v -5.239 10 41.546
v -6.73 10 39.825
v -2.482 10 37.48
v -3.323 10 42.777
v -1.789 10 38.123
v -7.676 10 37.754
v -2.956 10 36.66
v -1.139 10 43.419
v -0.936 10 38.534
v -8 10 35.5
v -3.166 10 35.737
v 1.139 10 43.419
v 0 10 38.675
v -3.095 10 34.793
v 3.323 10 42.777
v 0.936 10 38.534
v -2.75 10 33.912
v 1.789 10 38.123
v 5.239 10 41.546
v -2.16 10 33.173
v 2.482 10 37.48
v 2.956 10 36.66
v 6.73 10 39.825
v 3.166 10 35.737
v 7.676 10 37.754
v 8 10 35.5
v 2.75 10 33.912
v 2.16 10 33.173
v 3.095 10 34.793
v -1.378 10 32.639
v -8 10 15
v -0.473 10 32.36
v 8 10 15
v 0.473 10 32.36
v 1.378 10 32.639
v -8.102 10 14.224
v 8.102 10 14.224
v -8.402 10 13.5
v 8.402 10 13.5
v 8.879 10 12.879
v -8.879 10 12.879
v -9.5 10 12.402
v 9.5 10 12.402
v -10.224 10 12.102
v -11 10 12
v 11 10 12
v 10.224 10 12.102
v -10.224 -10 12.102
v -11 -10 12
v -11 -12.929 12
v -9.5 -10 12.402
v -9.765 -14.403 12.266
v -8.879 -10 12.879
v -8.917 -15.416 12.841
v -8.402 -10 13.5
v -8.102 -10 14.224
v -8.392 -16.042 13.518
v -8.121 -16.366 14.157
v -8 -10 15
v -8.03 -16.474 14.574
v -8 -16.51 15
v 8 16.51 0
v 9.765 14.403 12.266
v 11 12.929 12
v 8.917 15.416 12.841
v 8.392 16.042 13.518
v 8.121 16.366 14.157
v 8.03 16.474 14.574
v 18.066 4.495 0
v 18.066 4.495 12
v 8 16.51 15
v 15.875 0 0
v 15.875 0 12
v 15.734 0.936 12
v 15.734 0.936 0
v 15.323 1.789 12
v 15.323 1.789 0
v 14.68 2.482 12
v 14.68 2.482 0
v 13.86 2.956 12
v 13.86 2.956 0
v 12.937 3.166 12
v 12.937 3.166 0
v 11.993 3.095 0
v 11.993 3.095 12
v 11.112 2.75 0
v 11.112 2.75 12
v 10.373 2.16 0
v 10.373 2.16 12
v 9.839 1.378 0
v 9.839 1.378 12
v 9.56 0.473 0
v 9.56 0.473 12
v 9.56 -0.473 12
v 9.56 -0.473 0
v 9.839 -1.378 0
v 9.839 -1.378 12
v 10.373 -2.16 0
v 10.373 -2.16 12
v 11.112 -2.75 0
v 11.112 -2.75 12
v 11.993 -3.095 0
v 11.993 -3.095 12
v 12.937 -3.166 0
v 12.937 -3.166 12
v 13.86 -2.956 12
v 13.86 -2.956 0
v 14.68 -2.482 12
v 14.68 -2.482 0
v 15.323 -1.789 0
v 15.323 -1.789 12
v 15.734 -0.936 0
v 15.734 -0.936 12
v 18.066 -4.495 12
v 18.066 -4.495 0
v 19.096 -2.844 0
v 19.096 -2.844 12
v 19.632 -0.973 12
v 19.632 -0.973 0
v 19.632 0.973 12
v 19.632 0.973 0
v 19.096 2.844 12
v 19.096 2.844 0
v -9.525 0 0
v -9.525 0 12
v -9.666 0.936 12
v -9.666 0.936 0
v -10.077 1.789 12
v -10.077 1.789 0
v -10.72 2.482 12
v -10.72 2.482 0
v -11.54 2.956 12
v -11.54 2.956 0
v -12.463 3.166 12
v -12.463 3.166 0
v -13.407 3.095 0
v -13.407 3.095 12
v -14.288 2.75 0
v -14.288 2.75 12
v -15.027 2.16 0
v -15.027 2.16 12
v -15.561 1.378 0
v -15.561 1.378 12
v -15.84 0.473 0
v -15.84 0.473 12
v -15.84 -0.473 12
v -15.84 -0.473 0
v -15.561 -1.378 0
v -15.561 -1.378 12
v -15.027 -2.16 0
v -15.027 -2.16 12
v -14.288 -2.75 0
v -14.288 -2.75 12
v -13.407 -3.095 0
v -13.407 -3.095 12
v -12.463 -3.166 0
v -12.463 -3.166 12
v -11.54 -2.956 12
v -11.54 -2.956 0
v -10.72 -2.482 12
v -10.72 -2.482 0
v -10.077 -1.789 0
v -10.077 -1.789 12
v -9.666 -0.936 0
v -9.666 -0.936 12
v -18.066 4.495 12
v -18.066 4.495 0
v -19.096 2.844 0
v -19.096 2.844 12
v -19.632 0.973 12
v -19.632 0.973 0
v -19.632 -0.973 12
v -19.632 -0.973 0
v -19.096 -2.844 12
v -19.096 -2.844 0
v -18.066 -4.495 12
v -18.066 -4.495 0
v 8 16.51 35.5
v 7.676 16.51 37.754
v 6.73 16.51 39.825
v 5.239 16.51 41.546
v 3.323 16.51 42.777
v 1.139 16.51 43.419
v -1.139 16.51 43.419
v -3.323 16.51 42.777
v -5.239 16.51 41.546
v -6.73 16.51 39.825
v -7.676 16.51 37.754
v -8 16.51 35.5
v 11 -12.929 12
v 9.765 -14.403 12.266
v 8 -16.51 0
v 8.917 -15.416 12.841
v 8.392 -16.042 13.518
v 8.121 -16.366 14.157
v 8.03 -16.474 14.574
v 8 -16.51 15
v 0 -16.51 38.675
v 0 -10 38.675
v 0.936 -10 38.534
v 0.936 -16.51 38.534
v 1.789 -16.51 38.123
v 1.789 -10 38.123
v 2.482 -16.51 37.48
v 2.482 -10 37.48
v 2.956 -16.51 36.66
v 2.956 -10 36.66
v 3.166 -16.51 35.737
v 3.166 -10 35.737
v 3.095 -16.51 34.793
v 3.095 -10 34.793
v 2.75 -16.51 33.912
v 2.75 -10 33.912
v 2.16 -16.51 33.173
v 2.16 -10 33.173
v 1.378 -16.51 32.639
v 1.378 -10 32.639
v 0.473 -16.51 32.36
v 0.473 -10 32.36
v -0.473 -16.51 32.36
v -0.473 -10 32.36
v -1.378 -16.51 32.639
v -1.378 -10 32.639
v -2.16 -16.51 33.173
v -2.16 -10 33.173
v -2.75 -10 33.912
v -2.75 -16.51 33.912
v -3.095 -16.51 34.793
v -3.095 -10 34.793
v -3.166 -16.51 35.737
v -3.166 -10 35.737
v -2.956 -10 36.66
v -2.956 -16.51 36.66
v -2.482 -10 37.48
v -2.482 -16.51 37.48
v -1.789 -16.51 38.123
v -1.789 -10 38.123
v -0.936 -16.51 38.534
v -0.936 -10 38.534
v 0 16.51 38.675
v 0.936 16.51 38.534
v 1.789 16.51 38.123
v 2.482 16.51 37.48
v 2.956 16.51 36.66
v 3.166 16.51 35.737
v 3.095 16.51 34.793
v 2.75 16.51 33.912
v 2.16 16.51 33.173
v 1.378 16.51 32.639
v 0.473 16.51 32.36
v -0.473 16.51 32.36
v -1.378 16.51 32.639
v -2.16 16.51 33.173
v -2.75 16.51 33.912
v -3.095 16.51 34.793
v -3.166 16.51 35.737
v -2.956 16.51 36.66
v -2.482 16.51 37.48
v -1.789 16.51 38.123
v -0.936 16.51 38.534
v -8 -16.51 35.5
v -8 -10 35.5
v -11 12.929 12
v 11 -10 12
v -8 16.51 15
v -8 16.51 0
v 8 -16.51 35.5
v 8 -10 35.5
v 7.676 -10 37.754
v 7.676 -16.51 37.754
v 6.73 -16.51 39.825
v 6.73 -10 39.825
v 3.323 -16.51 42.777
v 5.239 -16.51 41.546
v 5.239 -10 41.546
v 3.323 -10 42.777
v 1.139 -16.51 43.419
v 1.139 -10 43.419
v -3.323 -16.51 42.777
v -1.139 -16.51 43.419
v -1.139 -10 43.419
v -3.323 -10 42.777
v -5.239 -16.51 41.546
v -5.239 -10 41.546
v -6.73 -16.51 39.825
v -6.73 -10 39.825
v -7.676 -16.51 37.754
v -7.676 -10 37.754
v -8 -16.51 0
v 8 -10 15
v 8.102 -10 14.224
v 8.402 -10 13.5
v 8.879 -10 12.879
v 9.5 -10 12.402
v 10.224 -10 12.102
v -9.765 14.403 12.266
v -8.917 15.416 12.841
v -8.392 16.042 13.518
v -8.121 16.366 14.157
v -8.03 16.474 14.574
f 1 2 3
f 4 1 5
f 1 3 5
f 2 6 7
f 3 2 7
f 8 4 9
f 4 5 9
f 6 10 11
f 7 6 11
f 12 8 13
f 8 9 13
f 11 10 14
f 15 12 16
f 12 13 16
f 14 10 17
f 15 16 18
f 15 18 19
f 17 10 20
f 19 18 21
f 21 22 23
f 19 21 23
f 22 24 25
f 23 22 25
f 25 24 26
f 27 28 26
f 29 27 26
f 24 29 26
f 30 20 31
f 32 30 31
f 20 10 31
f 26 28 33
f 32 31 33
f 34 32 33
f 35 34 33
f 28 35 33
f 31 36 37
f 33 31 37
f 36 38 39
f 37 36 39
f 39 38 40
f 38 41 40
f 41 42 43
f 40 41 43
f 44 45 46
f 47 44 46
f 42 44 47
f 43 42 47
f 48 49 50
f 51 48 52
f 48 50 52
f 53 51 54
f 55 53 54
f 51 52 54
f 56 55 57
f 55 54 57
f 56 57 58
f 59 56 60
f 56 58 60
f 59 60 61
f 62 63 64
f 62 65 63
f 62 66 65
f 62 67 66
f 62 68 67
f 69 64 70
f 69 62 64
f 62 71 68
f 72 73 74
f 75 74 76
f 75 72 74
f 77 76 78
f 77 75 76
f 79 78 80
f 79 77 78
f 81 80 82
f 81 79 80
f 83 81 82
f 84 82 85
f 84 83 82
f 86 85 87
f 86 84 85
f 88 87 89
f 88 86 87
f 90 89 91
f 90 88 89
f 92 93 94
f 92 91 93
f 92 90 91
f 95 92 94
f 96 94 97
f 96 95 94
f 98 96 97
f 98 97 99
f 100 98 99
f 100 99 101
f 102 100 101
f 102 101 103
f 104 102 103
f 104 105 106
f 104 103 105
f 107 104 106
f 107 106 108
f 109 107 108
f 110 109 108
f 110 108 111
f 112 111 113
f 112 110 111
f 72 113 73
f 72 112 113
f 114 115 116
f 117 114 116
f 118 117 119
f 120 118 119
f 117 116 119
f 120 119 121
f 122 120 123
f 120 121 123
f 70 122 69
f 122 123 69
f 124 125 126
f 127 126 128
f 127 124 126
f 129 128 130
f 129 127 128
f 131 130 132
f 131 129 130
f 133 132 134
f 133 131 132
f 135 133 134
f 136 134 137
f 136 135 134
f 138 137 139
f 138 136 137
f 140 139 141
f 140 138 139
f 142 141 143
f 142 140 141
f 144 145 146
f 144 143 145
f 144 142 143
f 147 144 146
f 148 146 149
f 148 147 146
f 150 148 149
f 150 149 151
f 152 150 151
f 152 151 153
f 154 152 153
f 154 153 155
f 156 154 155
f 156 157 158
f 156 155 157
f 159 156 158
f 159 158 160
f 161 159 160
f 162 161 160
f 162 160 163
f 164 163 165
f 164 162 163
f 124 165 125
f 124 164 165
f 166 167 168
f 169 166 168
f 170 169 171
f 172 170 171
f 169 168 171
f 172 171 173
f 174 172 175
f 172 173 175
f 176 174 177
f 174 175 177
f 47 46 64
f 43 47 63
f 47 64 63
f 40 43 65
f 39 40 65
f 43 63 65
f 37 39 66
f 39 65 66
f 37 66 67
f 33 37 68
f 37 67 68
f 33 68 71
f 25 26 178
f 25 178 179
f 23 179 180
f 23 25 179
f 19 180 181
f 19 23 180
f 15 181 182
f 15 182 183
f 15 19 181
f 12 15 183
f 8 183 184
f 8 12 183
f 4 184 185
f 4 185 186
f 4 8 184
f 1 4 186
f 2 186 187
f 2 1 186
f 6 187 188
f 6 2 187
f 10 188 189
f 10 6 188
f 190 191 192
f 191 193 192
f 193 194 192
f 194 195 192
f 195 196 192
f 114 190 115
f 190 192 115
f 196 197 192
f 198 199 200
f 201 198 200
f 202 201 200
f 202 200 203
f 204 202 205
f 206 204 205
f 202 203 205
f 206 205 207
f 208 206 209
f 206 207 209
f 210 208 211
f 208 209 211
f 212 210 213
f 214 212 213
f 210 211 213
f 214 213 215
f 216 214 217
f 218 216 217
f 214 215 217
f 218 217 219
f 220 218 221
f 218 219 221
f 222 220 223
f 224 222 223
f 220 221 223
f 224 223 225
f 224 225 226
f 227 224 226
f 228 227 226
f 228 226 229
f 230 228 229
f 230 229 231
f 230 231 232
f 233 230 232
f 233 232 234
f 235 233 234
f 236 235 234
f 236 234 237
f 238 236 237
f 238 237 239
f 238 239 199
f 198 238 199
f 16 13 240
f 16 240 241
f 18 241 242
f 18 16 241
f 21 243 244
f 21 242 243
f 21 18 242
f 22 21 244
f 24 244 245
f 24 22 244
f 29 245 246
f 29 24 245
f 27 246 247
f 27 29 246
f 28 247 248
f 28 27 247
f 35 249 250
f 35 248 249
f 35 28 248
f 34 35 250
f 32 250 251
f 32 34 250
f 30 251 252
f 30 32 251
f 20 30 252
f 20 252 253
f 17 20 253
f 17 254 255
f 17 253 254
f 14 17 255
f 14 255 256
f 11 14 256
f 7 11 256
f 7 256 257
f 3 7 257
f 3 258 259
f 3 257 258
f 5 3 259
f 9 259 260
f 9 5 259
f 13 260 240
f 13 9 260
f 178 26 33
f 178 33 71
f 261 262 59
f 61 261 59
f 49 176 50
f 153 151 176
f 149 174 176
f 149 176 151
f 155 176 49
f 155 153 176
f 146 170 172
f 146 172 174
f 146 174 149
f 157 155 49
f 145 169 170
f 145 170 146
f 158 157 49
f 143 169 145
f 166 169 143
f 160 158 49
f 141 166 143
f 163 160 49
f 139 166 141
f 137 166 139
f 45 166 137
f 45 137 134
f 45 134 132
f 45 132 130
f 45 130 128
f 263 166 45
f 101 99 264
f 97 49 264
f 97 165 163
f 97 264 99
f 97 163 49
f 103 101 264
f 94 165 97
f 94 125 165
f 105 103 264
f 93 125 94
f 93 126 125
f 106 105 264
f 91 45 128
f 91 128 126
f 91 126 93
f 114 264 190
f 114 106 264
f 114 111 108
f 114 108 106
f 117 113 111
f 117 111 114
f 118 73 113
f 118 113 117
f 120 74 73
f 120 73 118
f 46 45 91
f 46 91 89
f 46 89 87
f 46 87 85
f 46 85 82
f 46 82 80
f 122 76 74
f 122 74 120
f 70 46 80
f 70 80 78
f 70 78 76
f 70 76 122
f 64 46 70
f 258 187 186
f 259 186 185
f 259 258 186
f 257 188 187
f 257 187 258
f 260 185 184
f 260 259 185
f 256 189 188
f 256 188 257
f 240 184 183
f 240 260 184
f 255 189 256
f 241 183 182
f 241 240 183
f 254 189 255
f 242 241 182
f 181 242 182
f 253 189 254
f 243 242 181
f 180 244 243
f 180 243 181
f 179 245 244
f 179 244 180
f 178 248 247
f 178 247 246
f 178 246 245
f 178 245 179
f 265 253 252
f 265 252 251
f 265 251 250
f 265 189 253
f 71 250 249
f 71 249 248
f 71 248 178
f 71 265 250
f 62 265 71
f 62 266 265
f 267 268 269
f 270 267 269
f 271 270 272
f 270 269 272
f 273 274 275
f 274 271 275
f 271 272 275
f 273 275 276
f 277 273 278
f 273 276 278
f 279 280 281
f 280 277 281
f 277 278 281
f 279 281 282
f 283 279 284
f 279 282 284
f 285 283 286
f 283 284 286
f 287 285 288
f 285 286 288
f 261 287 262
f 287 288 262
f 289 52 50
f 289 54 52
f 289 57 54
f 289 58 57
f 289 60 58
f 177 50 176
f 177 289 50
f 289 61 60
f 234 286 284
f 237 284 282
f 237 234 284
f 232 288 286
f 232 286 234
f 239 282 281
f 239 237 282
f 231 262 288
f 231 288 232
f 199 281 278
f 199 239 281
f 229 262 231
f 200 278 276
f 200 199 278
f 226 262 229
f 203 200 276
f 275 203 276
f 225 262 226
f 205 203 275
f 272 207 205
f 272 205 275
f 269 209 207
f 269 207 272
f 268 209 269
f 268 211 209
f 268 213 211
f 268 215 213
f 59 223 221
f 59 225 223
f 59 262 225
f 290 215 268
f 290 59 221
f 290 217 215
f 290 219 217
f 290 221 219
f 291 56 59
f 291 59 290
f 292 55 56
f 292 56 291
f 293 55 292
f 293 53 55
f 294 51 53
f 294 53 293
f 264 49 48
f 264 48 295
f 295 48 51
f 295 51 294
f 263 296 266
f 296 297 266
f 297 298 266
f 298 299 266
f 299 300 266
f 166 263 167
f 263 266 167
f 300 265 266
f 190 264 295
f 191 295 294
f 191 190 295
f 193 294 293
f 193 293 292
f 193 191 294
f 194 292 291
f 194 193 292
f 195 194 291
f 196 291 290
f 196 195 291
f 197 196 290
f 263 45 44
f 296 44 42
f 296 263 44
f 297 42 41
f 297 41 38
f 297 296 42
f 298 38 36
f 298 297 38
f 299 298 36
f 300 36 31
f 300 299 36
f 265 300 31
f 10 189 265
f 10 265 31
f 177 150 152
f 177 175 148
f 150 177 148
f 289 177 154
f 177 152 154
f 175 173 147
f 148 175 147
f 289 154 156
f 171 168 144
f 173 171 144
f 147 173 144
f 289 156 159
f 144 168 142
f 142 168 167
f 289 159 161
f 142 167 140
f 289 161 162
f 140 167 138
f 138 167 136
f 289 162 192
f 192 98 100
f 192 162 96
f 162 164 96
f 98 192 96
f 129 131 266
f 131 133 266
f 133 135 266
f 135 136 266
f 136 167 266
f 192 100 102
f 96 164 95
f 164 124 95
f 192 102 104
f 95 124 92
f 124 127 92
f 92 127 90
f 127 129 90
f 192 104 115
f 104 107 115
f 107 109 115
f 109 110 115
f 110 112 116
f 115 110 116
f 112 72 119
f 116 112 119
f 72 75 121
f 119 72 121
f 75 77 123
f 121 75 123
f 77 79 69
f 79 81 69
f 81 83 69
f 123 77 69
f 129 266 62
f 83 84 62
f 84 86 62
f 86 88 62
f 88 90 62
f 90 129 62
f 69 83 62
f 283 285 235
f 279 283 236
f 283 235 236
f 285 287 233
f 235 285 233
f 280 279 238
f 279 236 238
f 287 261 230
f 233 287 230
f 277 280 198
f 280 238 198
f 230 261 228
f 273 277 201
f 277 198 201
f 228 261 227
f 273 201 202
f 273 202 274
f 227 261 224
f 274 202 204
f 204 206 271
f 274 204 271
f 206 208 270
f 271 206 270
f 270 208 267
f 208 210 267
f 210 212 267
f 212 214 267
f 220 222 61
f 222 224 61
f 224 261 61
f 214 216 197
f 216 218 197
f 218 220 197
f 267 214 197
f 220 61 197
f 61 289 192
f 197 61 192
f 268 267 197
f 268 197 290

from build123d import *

# Parameters (mm, degrees)
SKETCH1_W                      = 41.4
SKETCH1_H                      = 33.02
SKETCH1_R                      = 3.175
BOSS_EXTRUDE1_DEPTH            = 12
SKETCH2_W                      = 41.4
SKETCH2_H                      = 6.51
BOSS_EXTRUDE2_DEPTH            = 53
CUT_EXTRUDE1_REACH             = 72.186
SKETCH4_R                      = 3.175
CUT_EXTRUDE1_DIRECTION_2_REACH = 72.186
CUT_EXTRUDE3_REACH             = 72.186
CUT_EXTRUDE3_DIRECTION_2_REACH = 72.186
CUT_EXTRUDE4_DEPTH             = 12
BOSS_EXTRUDE3_DEPTH            = 12
FILLET3_R                      = 3


with BuildPart() as part:
    # Sketch1 → Boss-Extrude1 (new body)
    with BuildSketch(Plane.XY):
        Rectangle(SKETCH1_W, SKETCH1_H)
        with Locations((12.7, 0)):
            Circle(SKETCH1_R, mode=Mode.SUBTRACT)
        with Locations((-12.7, 0)):
            Circle(SKETCH1_R, mode=Mode.SUBTRACT)
    extrude(amount=BOSS_EXTRUDE1_DEPTH)

    # Sketch2 → Boss-Extrude2 (add)
    with BuildSketch(Plane.XY.offset(12)):
        with Locations((0, 13.255)):
            Rectangle(SKETCH2_W, SKETCH2_H)
        with Locations((0, -13.255)):
            Rectangle(SKETCH2_W, SKETCH2_H)
    extrude(amount=BOSS_EXTRUDE2_DEPTH)

    # Cut-Extrude1: up to this face of the body (flat: up to its plane)
    cut_extrude1_end = Plane(part.part.faces().sort_by_distance((0, -16.51, 32.5))[0])
    # Sketch4 → Cut-Extrude1 (cut, up to the picked face)
    with BuildSketch(Plane(origin=(0, 0, 0), x_dir=(1, 0, 0), z_dir=(0, 1, 0)), mode=Mode.PRIVATE) as cut_extrude1_sk1:
        with Locations(Location((0, -35.5, 0), (0, 0, 270))):
            Circle(SKETCH4_R)
    cut_extrude1_tool1 = split(extrude(cut_extrude1_sk1.sketch, amount=-CUT_EXTRUDE1_REACH, mode=Mode.PRIVATE), bisect_by=cut_extrude1_end, keep=Keep.BOTH, mode=Mode.PRIVATE)
    add(cut_extrude1_tool1.solids().sort_by(Axis((0, 0, 35.5), (0, -1, 0)))[0], mode=Mode.SUBTRACT)

    # Cut-Extrude1 direction 2: up to this face of the body (flat: up to its plane)
    cut_extrude1_direction_2_end = Plane(part.part.faces().sort_by_distance((0, 16.51, 32.5))[0])
    # Sketch4 → Cut-Extrude1 direction 2 (cut, up to the picked face)
    with BuildSketch(Plane(origin=(0, 0, 0), x_dir=(1, 0, 0), z_dir=(0, 1, 0)), mode=Mode.PRIVATE) as cut_extrude1_direction_2_sk1:
        with Locations(Location((0, -35.5, 0), (0, 0, 270))):
            Circle(SKETCH4_R)
    cut_extrude1_direction_2_tool1 = split(extrude(cut_extrude1_direction_2_sk1.sketch, amount=CUT_EXTRUDE1_DIRECTION_2_REACH, mode=Mode.PRIVATE), bisect_by=cut_extrude1_direction_2_end, keep=Keep.BOTH, mode=Mode.PRIVATE)
    add(cut_extrude1_direction_2_tool1.solids().sort_by(Axis((0, 0, 35.5), (0, 1, 0)))[0], mode=Mode.SUBTRACT)

    # Cut-Extrude3: up to this face of the body (flat: up to its plane)
    cut_extrude3_end = Plane(part.part.faces().sort_by_distance((-19.929353518, -16.51, 32.5))[0])
    # Sketch6 → Cut-Extrude3 (cut, up to the picked face)
    with BuildSketch(Plane(origin=(0, 0, 0), x_dir=(1, 0, 0), z_dir=(0, 1, 0)), mode=Mode.PRIVATE) as cut_extrude3_sk1:
        with BuildLine():
            Line((-8, -35.5), (-8, -20))
            Line((-8, -20), (-8, -12))
            Line((-8, -12), (-16, -12))
            Line((-16, -12), (-20.7, -12))
            Line((-20.7, -12), (-20.7, -65))
            Line((-20.7, -65), (20.7, -65))
            Line((20.7, -65), (20.7, -12))
            Line((20.7, -12), (16, -12))
            Line((16, -12), (8, -12))
            Line((8, -12), (8, -20))
            Line((8, -20), (8, -35.5))
            ThreePointArc((8, -35.5), (0, -43.5), (-8, -35.5))
        make_face()
    cut_extrude3_tool1 = split(extrude(cut_extrude3_sk1.sketch, amount=-CUT_EXTRUDE3_REACH, mode=Mode.PRIVATE), bisect_by=cut_extrude3_end, keep=Keep.BOTH, mode=Mode.PRIVATE)
    add(cut_extrude3_tool1.solids().sort_by(Axis((-8.67253, 0, 27.75), (0, -1, 0)))[0], mode=Mode.SUBTRACT)

    # Cut-Extrude3 direction 2: up to this face of the body (flat: up to its plane)
    cut_extrude3_direction_2_end = Plane(part.part.faces().sort_by_distance((19.929353518, 16.51, 32.5))[0])
    # Sketch6 → Cut-Extrude3 direction 2 (cut, up to the picked face)
    with BuildSketch(Plane(origin=(0, 0, 0), x_dir=(1, 0, 0), z_dir=(0, 1, 0)), mode=Mode.PRIVATE) as cut_extrude3_direction_2_sk1:
        with BuildLine():
            Line((-8, -35.5), (-8, -20))
            Line((-8, -20), (-8, -12))
            Line((-8, -12), (-16, -12))
            Line((-16, -12), (-20.7, -12))
            Line((-20.7, -12), (-20.7, -65))
            Line((-20.7, -65), (20.7, -65))
            Line((20.7, -65), (20.7, -12))
            Line((20.7, -12), (16, -12))
            Line((16, -12), (8, -12))
            Line((8, -12), (8, -20))
            Line((8, -20), (8, -35.5))
            ThreePointArc((8, -35.5), (0, -43.5), (-8, -35.5))
        make_face()
    cut_extrude3_direction_2_tool1 = split(extrude(cut_extrude3_direction_2_sk1.sketch, amount=CUT_EXTRUDE3_DIRECTION_2_REACH, mode=Mode.PRIVATE), bisect_by=cut_extrude3_direction_2_end, keep=Keep.BOTH, mode=Mode.PRIVATE)
    add(cut_extrude3_direction_2_tool1.solids().sort_by(Axis((-8.67253, 0, 27.75), (0, 1, 0)))[0], mode=Mode.SUBTRACT)

    # Sketch7 → Cut-Extrude4 (cut)
    with BuildSketch(Plane.XY):
        with BuildLine():
            ThreePointArc((-12.7, 7), (-19.7, 0), (-12.7, -7))
            Line((-12.7, -7), (-8, -7))
            Line((-8, -7), (-8, -16.51))
            Line((-8, -16.51), (-20.7, -16.51))
            Line((-20.7, -16.51), (-20.7, 16.51))
            Line((-20.7, 16.51), (-8, 16.51))
            Line((-8, 16.51), (-8, 7))
            Line((-8, 7), (-12.7, 7))
        make_face()
        with BuildLine():
            Line((12.7, 7), (8, 7))
            Line((8, 7), (8, 16.51))
            Line((8, 16.51), (20.7, 16.51))
            Line((20.7, 16.51), (20.7, -16.51))
            Line((20.7, -16.51), (8, -16.51))
            Line((8, -16.51), (8, -7))
            Line((8, -7), (12.7, -7))
            ThreePointArc((12.7, -7), (19.7, 0), (12.7, 7))
        make_face()
    extrude(amount=CUT_EXTRUDE4_DEPTH, mode=Mode.SUBTRACT)

    # Sketch8 → Boss-Extrude3 (add)
    with BuildSketch(Plane.XY):
        with BuildLine():
            Line((8, -16.51), (18.065759147, -4.495400847))
            ThreePointArc((18.065759147, -4.495400847), (15.660759537, -6.343020019), (12.7, -7))
            Line((12.7, -7), (8, -7))
            Line((8, -7), (8, -16.51))
        make_face()
        with BuildLine():
            ThreePointArc((-18.065759147, -4.495400847), (-15.660759537, -6.343020019), (-12.7, -7))
            Line((-12.7, -7), (-8, -7))
            Line((-8, -7), (-8, -16.51))
            Line((-8, -16.51), (-18.065759147, -4.495400847))
        make_face()
        with BuildLine():
            Line((8, 16.51), (18.065759147, 4.495400847))
            ThreePointArc((18.065759147, 4.495400847), (15.660759537, 6.343020019), (12.7, 7))
            Line((12.7, 7), (8, 7))
            Line((8, 7), (8, 16.51))
        make_face()
        with BuildLine():
            Line((-8, 16.51), (-18.065759147, 4.495400847))
            ThreePointArc((-18.065759147, 4.495400847), (-15.660759537, 6.343020019), (-12.7, 7))
            Line((-12.7, 7), (-8, 7))
            Line((-8, 7), (-8, 16.51))
        make_face()
    extrude(amount=BOSS_EXTRUDE3_DEPTH)

    # Fillet3
    fillet3_edges = [part.edges().sort_by_distance(p)[0] for p in [
        (8, -13.255, 12),
        (-8, -13.255, 12),
        (8, 13.255, 12),
        (-8, 13.255, 12),
    ]]
    fillet(fillet3_edges, radius=FILLET3_R)


solid = part.part
